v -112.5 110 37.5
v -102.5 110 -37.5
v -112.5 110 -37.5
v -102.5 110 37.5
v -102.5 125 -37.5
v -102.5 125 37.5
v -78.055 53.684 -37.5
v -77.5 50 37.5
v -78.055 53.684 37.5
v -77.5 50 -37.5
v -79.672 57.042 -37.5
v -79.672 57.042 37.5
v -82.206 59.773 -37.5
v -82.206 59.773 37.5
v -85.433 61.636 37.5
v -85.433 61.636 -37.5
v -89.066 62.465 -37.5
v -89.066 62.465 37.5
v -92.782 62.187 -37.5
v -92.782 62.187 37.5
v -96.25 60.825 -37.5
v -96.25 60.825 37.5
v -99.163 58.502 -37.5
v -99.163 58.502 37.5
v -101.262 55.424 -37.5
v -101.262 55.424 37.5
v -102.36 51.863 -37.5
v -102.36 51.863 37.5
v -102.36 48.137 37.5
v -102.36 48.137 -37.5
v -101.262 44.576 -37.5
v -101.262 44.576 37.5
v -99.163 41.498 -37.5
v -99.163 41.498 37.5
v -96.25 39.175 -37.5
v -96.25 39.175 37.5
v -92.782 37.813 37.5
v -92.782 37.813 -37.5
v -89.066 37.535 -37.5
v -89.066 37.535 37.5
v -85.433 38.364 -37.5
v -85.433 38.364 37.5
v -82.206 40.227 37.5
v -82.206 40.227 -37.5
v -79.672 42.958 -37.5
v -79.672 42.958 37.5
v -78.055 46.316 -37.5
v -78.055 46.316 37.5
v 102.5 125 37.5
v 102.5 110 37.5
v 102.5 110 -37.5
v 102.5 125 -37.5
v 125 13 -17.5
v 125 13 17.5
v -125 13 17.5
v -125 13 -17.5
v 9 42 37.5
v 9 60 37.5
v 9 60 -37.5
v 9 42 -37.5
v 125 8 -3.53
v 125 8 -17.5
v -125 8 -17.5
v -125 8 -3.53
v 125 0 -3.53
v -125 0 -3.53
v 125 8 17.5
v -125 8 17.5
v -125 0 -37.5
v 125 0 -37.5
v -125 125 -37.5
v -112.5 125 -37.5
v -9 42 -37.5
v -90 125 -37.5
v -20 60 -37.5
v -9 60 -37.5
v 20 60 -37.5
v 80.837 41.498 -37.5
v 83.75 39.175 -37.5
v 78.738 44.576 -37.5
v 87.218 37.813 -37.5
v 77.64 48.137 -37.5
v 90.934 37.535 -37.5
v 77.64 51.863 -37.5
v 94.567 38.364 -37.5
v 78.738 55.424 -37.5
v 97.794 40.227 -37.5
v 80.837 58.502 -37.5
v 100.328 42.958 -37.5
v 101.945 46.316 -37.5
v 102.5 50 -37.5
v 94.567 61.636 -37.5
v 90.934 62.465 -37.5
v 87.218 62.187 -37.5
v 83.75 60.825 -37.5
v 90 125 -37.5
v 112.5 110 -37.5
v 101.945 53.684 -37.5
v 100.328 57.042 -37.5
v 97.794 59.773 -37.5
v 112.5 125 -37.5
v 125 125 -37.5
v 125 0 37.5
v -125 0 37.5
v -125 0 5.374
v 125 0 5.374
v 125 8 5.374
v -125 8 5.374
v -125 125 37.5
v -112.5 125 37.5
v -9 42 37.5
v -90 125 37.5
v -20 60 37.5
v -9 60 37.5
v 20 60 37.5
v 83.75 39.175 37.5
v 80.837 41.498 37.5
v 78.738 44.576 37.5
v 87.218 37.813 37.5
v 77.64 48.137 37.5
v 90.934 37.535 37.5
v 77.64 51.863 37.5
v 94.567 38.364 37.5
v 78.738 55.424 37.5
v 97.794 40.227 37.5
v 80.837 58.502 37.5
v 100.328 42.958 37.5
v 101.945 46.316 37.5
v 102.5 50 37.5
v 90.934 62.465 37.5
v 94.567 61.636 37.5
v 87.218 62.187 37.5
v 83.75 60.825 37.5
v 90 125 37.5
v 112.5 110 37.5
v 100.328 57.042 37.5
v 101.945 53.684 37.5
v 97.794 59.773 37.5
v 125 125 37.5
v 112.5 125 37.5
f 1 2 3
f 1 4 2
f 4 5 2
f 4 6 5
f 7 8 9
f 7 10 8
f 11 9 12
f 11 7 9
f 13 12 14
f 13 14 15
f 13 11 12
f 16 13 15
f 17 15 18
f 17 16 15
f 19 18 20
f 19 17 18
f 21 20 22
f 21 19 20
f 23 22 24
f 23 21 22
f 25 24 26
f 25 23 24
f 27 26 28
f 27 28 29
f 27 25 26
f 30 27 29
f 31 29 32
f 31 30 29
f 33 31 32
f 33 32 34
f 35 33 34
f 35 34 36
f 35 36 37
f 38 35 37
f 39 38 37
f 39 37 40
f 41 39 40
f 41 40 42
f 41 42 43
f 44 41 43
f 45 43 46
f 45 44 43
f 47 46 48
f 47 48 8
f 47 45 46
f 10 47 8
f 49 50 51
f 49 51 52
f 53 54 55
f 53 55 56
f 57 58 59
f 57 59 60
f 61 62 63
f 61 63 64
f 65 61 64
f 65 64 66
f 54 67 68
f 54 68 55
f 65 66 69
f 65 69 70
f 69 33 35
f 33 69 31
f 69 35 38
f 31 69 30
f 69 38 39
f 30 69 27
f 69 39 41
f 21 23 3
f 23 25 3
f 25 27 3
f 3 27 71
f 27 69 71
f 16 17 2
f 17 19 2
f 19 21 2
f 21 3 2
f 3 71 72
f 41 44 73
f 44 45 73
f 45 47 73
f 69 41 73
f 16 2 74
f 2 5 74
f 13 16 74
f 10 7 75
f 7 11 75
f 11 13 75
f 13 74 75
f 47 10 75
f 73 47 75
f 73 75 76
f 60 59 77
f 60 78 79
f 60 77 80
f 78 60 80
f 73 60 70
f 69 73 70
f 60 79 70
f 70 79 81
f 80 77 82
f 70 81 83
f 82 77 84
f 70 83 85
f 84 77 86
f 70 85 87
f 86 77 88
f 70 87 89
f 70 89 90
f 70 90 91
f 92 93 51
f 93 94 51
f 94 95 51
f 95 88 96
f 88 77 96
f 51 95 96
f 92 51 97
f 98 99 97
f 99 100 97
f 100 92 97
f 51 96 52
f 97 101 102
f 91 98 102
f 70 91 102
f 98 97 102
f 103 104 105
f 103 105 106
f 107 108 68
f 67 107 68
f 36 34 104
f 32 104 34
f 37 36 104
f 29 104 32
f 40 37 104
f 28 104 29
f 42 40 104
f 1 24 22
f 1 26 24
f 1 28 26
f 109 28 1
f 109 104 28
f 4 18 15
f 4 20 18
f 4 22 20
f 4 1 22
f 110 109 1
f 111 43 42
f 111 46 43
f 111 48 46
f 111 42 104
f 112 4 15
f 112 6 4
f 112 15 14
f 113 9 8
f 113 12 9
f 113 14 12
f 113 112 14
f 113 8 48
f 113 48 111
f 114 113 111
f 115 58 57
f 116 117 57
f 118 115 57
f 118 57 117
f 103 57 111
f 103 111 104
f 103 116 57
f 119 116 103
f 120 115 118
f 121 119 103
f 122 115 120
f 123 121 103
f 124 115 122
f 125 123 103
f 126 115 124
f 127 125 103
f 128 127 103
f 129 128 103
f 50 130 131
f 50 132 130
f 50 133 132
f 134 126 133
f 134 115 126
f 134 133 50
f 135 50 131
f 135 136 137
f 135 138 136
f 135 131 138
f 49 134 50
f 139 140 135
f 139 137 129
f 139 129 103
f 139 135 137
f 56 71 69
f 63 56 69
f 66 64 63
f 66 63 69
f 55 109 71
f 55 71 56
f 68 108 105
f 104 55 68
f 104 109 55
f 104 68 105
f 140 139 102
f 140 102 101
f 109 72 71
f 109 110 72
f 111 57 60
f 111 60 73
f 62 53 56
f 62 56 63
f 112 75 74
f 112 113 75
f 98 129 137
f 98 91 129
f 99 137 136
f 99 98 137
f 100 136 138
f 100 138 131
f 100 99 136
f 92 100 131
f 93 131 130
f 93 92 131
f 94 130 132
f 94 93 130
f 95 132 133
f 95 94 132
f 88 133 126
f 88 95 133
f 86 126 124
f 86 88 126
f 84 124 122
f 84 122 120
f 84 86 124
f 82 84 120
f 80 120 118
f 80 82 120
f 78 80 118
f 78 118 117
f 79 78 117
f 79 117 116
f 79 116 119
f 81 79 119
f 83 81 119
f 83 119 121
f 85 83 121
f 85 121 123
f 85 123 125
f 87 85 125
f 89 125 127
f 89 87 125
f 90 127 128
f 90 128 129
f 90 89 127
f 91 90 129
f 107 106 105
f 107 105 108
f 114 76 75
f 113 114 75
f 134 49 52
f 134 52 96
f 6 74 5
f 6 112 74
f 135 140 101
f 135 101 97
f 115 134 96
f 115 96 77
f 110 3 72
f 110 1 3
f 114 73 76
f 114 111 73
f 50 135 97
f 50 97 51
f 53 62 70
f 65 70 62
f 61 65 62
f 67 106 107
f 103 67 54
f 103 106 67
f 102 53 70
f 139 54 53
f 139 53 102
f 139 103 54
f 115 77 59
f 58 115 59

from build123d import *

# Parameters (mm, degrees)
SKETCH2_R           = 12.5
BOSS_EXTRUDE1_DEPTH = 37.5
CUT_EXTRUDE1_DEPTH  = 300


with BuildPart() as part:
    # Sketch2 → Boss-Extrude1 (new body, symmetric)
    with BuildSketch(Plane.XY):
        Polygon((-125, 0), (125, 0), (125, 125), (112.5, 125), (112.5, 110), (102.5, 110), (102.5, 125), (90, 125), (20, 60), (9, 60), (9, 42), (-9, 42), (-9, 60), (-20, 60), (-90, 125), (-102.5, 125), (-102.5, 110), (-112.5, 110), (-112.5, 125), (-125, 125), align=None)
        with Locations((-90, 50)):
            Circle(SKETCH2_R, mode=Mode.SUBTRACT)
        with Locations((90, 50)):
            Circle(SKETCH2_R, mode=Mode.SUBTRACT)
    extrude(amount=BOSS_EXTRUDE1_DEPTH, both=True)

    # Sketch3 → Cut-Extrude1 (cut)
    with BuildSketch(Plane(origin=(125, 0, 0), x_dir=(0, 0, -1), z_dir=(1, 0, 0))):
        Polygon((-17.5, 13), (17.5, 13), (17.5, 8), (3.530117055, 8), (3.530117055, 0), (-5.373528479, 0), (-5.373528479, 8), (-17.5, 8), align=None)
    extrude(amount=-CUT_EXTRUDE1_DEPTH, mode=Mode.SUBTRACT)


solid = part.part
